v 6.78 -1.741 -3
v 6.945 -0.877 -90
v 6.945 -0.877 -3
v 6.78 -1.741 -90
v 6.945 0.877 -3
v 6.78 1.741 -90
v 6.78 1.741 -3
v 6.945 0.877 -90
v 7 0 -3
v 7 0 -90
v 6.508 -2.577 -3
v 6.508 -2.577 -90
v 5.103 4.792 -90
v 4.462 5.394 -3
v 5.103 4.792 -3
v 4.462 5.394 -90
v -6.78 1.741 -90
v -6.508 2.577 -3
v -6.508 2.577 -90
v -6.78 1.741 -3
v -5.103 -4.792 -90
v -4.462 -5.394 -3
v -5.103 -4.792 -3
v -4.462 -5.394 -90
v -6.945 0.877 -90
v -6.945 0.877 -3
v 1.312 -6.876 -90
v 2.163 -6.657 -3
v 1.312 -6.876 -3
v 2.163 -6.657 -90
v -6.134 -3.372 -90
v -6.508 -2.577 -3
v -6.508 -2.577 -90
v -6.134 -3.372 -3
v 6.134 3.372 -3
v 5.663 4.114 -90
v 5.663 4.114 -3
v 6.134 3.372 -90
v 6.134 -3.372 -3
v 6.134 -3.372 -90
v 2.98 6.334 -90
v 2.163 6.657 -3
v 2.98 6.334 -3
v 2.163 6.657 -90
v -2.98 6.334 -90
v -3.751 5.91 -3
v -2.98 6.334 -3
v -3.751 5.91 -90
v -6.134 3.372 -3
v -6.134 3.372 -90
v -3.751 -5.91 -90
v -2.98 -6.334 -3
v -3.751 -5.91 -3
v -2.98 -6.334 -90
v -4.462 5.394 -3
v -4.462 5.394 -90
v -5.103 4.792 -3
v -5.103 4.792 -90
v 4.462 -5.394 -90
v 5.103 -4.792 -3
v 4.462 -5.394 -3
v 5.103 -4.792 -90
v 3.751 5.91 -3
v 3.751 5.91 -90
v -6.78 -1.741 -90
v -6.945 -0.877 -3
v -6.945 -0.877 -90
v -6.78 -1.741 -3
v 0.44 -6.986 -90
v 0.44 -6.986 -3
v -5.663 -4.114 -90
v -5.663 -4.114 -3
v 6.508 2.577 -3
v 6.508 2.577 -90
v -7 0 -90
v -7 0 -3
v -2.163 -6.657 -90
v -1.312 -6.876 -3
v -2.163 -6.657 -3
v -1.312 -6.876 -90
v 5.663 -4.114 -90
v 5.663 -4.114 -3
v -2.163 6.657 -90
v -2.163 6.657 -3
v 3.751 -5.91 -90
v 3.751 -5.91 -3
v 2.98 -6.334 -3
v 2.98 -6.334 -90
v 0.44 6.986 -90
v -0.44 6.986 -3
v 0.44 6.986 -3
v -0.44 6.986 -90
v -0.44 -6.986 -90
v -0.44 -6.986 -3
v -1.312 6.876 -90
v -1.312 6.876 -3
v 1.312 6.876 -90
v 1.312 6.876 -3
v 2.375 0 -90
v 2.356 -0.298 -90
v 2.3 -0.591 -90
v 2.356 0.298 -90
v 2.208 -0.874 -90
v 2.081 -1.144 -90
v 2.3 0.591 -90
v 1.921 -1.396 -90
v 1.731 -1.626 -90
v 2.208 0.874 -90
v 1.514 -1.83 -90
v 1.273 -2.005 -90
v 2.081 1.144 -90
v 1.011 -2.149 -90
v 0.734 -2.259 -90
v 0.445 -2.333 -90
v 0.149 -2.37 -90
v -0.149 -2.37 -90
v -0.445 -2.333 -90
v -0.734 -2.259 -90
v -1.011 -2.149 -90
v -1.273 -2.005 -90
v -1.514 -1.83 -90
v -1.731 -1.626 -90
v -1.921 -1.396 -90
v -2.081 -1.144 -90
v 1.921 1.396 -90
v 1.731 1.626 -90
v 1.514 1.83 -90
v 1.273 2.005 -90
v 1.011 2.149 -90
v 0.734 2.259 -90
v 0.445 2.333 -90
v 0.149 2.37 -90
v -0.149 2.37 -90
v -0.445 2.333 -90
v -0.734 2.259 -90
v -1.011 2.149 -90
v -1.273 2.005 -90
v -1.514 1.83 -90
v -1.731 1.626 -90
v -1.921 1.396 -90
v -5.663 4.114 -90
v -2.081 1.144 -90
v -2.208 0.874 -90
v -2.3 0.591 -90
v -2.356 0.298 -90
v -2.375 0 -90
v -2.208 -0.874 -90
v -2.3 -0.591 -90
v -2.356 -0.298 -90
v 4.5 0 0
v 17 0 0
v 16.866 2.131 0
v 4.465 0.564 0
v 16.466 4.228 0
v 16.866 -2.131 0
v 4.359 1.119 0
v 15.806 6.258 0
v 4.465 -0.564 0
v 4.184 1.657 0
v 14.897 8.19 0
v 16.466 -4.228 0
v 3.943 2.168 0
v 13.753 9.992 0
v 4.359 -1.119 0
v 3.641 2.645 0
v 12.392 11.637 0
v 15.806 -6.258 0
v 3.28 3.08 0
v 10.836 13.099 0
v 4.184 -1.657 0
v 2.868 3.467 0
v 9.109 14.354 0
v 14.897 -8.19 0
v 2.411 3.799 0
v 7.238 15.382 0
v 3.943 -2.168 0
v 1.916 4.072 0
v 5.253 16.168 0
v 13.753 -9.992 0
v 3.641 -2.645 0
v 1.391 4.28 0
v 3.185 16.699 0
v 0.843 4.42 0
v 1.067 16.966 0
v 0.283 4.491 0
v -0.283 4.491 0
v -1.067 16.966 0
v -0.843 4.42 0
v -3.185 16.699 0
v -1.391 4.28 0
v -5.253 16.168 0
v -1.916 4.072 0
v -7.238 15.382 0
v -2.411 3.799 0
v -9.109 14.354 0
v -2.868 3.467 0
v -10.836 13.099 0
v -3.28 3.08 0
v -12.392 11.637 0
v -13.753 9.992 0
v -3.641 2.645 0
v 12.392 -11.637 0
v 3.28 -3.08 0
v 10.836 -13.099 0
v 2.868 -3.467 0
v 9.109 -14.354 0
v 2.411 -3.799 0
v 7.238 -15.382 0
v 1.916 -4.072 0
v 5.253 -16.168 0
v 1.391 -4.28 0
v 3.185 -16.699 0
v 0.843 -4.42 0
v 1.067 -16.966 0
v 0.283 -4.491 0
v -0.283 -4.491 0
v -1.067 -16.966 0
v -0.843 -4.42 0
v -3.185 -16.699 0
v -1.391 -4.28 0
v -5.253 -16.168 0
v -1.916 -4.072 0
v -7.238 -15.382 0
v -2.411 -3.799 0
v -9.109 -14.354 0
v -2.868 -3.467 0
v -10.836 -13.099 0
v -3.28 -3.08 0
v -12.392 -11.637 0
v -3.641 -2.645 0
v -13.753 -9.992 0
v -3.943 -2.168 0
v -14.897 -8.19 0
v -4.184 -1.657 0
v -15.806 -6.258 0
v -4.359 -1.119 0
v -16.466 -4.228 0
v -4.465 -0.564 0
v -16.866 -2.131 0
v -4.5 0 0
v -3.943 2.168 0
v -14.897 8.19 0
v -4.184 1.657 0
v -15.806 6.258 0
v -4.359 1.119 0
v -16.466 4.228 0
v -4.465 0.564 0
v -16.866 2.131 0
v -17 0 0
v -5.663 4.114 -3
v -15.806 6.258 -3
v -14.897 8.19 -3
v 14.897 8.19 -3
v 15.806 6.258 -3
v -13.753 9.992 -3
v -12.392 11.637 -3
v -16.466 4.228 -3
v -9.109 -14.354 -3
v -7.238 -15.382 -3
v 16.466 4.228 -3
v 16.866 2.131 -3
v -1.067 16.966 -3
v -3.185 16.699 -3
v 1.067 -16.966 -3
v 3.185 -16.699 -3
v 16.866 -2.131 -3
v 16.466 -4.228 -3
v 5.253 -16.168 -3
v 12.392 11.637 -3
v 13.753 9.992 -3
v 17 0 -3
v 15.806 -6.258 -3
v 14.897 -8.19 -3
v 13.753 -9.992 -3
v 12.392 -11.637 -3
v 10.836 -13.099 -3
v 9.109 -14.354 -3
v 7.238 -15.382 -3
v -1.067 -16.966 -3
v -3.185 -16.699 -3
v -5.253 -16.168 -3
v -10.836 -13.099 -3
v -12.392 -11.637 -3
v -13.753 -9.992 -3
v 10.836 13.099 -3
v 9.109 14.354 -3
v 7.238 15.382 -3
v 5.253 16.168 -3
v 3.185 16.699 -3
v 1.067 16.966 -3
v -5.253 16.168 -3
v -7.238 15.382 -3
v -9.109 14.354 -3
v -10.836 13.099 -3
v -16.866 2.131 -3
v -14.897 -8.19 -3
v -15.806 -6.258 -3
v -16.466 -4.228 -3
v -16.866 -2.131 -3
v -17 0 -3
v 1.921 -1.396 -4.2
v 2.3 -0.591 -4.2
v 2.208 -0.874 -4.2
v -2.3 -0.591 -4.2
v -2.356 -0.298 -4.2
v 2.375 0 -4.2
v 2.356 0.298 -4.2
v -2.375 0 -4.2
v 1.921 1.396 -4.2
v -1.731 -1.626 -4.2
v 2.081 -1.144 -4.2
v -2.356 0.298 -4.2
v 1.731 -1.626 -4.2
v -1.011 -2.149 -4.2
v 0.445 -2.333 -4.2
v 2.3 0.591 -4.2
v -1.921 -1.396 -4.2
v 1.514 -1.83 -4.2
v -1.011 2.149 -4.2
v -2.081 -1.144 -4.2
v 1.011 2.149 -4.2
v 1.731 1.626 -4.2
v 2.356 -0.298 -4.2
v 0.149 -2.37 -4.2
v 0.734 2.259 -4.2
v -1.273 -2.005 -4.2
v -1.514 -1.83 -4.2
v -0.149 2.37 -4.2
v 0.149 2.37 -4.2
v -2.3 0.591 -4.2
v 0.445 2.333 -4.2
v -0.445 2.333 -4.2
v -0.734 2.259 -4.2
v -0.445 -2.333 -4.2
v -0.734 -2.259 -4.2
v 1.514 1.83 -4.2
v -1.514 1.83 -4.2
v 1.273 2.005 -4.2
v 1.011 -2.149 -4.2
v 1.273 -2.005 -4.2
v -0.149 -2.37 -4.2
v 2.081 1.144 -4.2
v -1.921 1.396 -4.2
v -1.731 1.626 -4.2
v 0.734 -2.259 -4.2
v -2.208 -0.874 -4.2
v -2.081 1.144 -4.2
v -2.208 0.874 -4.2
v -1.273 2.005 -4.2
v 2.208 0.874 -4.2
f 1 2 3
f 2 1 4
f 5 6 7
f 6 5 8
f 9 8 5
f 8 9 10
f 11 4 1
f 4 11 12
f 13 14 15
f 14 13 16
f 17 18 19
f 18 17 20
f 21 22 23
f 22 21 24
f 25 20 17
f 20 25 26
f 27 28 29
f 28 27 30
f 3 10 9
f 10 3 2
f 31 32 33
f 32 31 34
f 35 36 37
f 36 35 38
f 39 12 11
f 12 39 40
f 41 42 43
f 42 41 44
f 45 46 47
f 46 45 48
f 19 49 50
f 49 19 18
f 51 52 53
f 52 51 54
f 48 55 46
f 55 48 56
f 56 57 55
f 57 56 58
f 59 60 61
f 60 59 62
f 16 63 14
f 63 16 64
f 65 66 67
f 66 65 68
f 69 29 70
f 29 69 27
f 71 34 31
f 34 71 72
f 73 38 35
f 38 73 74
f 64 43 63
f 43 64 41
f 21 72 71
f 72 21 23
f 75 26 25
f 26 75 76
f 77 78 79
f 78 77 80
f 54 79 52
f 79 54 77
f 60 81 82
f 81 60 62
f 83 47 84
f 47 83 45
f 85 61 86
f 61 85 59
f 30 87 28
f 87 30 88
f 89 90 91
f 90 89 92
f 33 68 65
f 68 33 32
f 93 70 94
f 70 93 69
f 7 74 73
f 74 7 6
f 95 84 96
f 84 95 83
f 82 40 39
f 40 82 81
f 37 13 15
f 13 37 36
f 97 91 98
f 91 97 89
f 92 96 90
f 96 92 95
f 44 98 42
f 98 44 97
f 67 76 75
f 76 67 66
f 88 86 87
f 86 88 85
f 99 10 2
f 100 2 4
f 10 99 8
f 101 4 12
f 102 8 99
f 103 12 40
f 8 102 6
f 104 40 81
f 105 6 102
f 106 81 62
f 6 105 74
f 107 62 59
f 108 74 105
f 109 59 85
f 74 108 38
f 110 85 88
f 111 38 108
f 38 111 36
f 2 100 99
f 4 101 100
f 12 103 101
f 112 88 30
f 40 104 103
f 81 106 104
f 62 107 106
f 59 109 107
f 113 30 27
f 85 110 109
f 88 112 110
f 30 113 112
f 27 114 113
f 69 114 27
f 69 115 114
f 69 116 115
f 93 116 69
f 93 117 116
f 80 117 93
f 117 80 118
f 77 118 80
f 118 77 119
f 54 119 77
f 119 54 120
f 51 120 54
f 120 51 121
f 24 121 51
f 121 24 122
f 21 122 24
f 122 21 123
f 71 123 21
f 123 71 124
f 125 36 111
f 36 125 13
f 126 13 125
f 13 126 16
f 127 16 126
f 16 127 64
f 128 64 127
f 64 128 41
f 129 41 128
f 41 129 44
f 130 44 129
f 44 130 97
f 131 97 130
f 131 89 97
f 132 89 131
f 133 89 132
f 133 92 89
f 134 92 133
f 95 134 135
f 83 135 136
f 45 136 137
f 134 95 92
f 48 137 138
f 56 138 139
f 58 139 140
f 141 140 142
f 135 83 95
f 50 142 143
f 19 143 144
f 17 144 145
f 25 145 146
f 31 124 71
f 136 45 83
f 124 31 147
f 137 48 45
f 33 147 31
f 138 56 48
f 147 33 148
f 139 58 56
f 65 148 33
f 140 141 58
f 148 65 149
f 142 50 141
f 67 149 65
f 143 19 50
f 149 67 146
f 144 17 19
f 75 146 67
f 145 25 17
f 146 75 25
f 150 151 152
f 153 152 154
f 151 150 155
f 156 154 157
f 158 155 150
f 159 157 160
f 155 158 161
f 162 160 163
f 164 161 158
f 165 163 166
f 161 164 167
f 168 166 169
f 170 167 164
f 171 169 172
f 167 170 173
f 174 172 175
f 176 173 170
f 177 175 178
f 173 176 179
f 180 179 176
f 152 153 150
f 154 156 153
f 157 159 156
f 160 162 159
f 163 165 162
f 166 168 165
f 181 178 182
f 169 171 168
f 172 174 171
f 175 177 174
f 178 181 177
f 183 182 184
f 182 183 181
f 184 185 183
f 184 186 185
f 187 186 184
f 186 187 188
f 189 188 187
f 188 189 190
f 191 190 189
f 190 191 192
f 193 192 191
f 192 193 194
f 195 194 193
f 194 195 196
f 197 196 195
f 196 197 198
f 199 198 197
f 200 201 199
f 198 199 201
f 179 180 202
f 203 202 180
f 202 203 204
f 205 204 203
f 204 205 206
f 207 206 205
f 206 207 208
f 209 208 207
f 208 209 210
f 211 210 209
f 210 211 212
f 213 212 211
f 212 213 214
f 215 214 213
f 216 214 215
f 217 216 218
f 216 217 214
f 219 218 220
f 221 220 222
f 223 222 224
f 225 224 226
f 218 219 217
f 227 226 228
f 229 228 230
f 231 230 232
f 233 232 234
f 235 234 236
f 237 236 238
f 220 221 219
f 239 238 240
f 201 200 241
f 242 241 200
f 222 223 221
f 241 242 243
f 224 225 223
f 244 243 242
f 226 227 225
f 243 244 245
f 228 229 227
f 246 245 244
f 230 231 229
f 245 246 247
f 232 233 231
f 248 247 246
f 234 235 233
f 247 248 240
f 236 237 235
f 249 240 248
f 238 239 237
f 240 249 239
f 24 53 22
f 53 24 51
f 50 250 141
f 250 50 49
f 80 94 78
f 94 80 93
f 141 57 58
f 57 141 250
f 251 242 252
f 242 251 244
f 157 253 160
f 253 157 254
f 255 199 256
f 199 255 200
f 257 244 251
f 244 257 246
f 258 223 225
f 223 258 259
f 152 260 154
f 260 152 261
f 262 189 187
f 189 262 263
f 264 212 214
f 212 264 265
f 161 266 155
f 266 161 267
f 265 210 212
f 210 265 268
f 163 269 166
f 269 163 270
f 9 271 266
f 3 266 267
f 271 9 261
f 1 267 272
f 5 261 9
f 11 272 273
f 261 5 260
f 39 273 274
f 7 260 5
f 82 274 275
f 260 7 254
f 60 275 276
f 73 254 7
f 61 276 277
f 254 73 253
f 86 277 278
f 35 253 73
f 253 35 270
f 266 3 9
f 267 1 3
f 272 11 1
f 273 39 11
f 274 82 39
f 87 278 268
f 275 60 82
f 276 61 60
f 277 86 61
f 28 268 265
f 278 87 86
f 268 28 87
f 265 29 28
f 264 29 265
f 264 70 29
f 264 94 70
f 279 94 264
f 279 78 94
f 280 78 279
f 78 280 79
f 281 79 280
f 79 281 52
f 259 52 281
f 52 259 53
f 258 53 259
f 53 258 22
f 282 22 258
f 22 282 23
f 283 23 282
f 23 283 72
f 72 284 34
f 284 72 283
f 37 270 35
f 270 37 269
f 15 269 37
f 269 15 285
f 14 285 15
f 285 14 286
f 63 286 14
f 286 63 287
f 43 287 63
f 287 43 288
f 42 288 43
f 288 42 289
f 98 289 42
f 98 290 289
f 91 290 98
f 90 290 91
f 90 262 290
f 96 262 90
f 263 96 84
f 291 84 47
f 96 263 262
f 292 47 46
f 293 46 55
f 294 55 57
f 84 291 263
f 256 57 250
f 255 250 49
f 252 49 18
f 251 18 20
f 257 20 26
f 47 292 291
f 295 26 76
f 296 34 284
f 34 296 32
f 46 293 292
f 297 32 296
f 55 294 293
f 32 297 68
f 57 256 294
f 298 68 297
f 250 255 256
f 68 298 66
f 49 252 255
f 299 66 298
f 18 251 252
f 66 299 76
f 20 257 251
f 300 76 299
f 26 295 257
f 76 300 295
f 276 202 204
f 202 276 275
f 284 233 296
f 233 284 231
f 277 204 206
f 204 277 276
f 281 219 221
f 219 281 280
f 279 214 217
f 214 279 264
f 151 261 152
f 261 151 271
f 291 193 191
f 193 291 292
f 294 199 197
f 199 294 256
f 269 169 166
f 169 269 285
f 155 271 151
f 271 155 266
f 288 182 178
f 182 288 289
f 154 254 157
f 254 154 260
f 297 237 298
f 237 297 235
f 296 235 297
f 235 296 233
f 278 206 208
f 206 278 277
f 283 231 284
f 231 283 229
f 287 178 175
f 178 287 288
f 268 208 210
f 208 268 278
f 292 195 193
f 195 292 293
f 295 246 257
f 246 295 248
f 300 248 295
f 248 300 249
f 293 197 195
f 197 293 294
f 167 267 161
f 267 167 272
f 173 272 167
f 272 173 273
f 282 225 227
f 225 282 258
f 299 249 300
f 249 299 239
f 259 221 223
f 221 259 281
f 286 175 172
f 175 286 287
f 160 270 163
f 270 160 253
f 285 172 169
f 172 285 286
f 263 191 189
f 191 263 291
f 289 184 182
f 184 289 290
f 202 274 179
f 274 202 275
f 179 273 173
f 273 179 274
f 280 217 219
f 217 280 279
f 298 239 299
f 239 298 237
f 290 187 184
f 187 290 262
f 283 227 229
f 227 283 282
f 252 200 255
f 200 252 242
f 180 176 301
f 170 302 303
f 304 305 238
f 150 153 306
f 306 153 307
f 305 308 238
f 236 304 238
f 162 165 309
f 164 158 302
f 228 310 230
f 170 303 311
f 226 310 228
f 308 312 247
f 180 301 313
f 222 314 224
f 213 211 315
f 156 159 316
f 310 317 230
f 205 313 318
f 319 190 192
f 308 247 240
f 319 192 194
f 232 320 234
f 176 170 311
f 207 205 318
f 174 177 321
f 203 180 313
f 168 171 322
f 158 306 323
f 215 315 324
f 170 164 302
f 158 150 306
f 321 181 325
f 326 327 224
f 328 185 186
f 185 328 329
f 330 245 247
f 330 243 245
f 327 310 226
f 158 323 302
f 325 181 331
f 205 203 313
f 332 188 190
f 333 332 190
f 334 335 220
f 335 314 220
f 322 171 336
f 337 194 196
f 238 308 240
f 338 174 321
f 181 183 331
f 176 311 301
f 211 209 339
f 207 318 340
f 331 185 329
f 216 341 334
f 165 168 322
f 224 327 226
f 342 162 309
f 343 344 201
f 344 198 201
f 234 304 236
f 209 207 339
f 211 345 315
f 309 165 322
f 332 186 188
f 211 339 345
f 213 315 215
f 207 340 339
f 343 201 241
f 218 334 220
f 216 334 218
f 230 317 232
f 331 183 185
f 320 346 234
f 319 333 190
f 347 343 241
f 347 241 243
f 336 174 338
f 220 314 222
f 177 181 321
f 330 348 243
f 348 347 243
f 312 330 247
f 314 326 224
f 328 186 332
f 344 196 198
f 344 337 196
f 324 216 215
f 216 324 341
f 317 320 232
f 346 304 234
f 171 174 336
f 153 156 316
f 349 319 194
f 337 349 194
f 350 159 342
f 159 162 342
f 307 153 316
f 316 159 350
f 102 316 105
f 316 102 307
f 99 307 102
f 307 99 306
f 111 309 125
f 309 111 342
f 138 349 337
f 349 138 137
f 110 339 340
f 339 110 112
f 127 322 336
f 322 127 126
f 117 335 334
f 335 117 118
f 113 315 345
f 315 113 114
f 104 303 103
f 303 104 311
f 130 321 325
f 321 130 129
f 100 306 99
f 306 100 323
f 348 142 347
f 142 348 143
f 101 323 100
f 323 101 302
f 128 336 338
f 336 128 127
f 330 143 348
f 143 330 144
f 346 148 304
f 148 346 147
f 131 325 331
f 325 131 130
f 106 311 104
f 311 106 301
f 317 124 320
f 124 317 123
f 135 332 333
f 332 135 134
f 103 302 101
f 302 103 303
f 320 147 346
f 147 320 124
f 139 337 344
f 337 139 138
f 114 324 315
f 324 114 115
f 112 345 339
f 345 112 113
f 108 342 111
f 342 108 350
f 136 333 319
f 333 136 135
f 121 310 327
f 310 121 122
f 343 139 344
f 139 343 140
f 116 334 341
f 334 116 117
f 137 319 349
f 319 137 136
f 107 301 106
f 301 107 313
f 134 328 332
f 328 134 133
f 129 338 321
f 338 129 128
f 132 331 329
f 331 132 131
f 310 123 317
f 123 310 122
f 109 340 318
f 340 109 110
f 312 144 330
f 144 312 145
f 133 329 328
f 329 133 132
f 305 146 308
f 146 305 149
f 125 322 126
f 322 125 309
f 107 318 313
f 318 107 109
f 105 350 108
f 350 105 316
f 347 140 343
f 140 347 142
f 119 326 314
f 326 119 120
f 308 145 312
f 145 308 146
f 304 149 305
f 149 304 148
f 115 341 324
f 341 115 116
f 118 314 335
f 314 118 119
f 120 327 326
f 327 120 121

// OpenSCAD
$fn = 50;


difference() {
	union() {
		translate(v = [0, 0, -90.0000000000]) {
			cylinder(h = 90, r = 7.0000000000);
		}
		translate(v = [0, 0, -3.0000000000]) {
			cylinder(h = 3, r = 17.0000000000);
		}
	}
	union() {
		translate(v = [0, 0, 0]) {
			rotate(a = [0, 0, 0]) {
				difference() {
					union() {
						#translate(v = [0, 0, -90.0000000000]) {
							cylinder(h = 90, r = 2.2500000000);
						}
						#translate(v = [0, 0, -4.2000000000]) {
							cylinder(h = 4.2000000000, r1 = 2.3750000000, r2 = 4.5000000000);
						}
						#translate(v = [0, 0, -90.0000000000]) {
							cylinder(h = 90, r = 2.3750000000);
						}
						#translate(v = [0, 0, -90.0000000000]) {
							cylinder(h = 90, r = 2.2500000000);
						}
					}
					union();
				}
			}
		}
	}
}
